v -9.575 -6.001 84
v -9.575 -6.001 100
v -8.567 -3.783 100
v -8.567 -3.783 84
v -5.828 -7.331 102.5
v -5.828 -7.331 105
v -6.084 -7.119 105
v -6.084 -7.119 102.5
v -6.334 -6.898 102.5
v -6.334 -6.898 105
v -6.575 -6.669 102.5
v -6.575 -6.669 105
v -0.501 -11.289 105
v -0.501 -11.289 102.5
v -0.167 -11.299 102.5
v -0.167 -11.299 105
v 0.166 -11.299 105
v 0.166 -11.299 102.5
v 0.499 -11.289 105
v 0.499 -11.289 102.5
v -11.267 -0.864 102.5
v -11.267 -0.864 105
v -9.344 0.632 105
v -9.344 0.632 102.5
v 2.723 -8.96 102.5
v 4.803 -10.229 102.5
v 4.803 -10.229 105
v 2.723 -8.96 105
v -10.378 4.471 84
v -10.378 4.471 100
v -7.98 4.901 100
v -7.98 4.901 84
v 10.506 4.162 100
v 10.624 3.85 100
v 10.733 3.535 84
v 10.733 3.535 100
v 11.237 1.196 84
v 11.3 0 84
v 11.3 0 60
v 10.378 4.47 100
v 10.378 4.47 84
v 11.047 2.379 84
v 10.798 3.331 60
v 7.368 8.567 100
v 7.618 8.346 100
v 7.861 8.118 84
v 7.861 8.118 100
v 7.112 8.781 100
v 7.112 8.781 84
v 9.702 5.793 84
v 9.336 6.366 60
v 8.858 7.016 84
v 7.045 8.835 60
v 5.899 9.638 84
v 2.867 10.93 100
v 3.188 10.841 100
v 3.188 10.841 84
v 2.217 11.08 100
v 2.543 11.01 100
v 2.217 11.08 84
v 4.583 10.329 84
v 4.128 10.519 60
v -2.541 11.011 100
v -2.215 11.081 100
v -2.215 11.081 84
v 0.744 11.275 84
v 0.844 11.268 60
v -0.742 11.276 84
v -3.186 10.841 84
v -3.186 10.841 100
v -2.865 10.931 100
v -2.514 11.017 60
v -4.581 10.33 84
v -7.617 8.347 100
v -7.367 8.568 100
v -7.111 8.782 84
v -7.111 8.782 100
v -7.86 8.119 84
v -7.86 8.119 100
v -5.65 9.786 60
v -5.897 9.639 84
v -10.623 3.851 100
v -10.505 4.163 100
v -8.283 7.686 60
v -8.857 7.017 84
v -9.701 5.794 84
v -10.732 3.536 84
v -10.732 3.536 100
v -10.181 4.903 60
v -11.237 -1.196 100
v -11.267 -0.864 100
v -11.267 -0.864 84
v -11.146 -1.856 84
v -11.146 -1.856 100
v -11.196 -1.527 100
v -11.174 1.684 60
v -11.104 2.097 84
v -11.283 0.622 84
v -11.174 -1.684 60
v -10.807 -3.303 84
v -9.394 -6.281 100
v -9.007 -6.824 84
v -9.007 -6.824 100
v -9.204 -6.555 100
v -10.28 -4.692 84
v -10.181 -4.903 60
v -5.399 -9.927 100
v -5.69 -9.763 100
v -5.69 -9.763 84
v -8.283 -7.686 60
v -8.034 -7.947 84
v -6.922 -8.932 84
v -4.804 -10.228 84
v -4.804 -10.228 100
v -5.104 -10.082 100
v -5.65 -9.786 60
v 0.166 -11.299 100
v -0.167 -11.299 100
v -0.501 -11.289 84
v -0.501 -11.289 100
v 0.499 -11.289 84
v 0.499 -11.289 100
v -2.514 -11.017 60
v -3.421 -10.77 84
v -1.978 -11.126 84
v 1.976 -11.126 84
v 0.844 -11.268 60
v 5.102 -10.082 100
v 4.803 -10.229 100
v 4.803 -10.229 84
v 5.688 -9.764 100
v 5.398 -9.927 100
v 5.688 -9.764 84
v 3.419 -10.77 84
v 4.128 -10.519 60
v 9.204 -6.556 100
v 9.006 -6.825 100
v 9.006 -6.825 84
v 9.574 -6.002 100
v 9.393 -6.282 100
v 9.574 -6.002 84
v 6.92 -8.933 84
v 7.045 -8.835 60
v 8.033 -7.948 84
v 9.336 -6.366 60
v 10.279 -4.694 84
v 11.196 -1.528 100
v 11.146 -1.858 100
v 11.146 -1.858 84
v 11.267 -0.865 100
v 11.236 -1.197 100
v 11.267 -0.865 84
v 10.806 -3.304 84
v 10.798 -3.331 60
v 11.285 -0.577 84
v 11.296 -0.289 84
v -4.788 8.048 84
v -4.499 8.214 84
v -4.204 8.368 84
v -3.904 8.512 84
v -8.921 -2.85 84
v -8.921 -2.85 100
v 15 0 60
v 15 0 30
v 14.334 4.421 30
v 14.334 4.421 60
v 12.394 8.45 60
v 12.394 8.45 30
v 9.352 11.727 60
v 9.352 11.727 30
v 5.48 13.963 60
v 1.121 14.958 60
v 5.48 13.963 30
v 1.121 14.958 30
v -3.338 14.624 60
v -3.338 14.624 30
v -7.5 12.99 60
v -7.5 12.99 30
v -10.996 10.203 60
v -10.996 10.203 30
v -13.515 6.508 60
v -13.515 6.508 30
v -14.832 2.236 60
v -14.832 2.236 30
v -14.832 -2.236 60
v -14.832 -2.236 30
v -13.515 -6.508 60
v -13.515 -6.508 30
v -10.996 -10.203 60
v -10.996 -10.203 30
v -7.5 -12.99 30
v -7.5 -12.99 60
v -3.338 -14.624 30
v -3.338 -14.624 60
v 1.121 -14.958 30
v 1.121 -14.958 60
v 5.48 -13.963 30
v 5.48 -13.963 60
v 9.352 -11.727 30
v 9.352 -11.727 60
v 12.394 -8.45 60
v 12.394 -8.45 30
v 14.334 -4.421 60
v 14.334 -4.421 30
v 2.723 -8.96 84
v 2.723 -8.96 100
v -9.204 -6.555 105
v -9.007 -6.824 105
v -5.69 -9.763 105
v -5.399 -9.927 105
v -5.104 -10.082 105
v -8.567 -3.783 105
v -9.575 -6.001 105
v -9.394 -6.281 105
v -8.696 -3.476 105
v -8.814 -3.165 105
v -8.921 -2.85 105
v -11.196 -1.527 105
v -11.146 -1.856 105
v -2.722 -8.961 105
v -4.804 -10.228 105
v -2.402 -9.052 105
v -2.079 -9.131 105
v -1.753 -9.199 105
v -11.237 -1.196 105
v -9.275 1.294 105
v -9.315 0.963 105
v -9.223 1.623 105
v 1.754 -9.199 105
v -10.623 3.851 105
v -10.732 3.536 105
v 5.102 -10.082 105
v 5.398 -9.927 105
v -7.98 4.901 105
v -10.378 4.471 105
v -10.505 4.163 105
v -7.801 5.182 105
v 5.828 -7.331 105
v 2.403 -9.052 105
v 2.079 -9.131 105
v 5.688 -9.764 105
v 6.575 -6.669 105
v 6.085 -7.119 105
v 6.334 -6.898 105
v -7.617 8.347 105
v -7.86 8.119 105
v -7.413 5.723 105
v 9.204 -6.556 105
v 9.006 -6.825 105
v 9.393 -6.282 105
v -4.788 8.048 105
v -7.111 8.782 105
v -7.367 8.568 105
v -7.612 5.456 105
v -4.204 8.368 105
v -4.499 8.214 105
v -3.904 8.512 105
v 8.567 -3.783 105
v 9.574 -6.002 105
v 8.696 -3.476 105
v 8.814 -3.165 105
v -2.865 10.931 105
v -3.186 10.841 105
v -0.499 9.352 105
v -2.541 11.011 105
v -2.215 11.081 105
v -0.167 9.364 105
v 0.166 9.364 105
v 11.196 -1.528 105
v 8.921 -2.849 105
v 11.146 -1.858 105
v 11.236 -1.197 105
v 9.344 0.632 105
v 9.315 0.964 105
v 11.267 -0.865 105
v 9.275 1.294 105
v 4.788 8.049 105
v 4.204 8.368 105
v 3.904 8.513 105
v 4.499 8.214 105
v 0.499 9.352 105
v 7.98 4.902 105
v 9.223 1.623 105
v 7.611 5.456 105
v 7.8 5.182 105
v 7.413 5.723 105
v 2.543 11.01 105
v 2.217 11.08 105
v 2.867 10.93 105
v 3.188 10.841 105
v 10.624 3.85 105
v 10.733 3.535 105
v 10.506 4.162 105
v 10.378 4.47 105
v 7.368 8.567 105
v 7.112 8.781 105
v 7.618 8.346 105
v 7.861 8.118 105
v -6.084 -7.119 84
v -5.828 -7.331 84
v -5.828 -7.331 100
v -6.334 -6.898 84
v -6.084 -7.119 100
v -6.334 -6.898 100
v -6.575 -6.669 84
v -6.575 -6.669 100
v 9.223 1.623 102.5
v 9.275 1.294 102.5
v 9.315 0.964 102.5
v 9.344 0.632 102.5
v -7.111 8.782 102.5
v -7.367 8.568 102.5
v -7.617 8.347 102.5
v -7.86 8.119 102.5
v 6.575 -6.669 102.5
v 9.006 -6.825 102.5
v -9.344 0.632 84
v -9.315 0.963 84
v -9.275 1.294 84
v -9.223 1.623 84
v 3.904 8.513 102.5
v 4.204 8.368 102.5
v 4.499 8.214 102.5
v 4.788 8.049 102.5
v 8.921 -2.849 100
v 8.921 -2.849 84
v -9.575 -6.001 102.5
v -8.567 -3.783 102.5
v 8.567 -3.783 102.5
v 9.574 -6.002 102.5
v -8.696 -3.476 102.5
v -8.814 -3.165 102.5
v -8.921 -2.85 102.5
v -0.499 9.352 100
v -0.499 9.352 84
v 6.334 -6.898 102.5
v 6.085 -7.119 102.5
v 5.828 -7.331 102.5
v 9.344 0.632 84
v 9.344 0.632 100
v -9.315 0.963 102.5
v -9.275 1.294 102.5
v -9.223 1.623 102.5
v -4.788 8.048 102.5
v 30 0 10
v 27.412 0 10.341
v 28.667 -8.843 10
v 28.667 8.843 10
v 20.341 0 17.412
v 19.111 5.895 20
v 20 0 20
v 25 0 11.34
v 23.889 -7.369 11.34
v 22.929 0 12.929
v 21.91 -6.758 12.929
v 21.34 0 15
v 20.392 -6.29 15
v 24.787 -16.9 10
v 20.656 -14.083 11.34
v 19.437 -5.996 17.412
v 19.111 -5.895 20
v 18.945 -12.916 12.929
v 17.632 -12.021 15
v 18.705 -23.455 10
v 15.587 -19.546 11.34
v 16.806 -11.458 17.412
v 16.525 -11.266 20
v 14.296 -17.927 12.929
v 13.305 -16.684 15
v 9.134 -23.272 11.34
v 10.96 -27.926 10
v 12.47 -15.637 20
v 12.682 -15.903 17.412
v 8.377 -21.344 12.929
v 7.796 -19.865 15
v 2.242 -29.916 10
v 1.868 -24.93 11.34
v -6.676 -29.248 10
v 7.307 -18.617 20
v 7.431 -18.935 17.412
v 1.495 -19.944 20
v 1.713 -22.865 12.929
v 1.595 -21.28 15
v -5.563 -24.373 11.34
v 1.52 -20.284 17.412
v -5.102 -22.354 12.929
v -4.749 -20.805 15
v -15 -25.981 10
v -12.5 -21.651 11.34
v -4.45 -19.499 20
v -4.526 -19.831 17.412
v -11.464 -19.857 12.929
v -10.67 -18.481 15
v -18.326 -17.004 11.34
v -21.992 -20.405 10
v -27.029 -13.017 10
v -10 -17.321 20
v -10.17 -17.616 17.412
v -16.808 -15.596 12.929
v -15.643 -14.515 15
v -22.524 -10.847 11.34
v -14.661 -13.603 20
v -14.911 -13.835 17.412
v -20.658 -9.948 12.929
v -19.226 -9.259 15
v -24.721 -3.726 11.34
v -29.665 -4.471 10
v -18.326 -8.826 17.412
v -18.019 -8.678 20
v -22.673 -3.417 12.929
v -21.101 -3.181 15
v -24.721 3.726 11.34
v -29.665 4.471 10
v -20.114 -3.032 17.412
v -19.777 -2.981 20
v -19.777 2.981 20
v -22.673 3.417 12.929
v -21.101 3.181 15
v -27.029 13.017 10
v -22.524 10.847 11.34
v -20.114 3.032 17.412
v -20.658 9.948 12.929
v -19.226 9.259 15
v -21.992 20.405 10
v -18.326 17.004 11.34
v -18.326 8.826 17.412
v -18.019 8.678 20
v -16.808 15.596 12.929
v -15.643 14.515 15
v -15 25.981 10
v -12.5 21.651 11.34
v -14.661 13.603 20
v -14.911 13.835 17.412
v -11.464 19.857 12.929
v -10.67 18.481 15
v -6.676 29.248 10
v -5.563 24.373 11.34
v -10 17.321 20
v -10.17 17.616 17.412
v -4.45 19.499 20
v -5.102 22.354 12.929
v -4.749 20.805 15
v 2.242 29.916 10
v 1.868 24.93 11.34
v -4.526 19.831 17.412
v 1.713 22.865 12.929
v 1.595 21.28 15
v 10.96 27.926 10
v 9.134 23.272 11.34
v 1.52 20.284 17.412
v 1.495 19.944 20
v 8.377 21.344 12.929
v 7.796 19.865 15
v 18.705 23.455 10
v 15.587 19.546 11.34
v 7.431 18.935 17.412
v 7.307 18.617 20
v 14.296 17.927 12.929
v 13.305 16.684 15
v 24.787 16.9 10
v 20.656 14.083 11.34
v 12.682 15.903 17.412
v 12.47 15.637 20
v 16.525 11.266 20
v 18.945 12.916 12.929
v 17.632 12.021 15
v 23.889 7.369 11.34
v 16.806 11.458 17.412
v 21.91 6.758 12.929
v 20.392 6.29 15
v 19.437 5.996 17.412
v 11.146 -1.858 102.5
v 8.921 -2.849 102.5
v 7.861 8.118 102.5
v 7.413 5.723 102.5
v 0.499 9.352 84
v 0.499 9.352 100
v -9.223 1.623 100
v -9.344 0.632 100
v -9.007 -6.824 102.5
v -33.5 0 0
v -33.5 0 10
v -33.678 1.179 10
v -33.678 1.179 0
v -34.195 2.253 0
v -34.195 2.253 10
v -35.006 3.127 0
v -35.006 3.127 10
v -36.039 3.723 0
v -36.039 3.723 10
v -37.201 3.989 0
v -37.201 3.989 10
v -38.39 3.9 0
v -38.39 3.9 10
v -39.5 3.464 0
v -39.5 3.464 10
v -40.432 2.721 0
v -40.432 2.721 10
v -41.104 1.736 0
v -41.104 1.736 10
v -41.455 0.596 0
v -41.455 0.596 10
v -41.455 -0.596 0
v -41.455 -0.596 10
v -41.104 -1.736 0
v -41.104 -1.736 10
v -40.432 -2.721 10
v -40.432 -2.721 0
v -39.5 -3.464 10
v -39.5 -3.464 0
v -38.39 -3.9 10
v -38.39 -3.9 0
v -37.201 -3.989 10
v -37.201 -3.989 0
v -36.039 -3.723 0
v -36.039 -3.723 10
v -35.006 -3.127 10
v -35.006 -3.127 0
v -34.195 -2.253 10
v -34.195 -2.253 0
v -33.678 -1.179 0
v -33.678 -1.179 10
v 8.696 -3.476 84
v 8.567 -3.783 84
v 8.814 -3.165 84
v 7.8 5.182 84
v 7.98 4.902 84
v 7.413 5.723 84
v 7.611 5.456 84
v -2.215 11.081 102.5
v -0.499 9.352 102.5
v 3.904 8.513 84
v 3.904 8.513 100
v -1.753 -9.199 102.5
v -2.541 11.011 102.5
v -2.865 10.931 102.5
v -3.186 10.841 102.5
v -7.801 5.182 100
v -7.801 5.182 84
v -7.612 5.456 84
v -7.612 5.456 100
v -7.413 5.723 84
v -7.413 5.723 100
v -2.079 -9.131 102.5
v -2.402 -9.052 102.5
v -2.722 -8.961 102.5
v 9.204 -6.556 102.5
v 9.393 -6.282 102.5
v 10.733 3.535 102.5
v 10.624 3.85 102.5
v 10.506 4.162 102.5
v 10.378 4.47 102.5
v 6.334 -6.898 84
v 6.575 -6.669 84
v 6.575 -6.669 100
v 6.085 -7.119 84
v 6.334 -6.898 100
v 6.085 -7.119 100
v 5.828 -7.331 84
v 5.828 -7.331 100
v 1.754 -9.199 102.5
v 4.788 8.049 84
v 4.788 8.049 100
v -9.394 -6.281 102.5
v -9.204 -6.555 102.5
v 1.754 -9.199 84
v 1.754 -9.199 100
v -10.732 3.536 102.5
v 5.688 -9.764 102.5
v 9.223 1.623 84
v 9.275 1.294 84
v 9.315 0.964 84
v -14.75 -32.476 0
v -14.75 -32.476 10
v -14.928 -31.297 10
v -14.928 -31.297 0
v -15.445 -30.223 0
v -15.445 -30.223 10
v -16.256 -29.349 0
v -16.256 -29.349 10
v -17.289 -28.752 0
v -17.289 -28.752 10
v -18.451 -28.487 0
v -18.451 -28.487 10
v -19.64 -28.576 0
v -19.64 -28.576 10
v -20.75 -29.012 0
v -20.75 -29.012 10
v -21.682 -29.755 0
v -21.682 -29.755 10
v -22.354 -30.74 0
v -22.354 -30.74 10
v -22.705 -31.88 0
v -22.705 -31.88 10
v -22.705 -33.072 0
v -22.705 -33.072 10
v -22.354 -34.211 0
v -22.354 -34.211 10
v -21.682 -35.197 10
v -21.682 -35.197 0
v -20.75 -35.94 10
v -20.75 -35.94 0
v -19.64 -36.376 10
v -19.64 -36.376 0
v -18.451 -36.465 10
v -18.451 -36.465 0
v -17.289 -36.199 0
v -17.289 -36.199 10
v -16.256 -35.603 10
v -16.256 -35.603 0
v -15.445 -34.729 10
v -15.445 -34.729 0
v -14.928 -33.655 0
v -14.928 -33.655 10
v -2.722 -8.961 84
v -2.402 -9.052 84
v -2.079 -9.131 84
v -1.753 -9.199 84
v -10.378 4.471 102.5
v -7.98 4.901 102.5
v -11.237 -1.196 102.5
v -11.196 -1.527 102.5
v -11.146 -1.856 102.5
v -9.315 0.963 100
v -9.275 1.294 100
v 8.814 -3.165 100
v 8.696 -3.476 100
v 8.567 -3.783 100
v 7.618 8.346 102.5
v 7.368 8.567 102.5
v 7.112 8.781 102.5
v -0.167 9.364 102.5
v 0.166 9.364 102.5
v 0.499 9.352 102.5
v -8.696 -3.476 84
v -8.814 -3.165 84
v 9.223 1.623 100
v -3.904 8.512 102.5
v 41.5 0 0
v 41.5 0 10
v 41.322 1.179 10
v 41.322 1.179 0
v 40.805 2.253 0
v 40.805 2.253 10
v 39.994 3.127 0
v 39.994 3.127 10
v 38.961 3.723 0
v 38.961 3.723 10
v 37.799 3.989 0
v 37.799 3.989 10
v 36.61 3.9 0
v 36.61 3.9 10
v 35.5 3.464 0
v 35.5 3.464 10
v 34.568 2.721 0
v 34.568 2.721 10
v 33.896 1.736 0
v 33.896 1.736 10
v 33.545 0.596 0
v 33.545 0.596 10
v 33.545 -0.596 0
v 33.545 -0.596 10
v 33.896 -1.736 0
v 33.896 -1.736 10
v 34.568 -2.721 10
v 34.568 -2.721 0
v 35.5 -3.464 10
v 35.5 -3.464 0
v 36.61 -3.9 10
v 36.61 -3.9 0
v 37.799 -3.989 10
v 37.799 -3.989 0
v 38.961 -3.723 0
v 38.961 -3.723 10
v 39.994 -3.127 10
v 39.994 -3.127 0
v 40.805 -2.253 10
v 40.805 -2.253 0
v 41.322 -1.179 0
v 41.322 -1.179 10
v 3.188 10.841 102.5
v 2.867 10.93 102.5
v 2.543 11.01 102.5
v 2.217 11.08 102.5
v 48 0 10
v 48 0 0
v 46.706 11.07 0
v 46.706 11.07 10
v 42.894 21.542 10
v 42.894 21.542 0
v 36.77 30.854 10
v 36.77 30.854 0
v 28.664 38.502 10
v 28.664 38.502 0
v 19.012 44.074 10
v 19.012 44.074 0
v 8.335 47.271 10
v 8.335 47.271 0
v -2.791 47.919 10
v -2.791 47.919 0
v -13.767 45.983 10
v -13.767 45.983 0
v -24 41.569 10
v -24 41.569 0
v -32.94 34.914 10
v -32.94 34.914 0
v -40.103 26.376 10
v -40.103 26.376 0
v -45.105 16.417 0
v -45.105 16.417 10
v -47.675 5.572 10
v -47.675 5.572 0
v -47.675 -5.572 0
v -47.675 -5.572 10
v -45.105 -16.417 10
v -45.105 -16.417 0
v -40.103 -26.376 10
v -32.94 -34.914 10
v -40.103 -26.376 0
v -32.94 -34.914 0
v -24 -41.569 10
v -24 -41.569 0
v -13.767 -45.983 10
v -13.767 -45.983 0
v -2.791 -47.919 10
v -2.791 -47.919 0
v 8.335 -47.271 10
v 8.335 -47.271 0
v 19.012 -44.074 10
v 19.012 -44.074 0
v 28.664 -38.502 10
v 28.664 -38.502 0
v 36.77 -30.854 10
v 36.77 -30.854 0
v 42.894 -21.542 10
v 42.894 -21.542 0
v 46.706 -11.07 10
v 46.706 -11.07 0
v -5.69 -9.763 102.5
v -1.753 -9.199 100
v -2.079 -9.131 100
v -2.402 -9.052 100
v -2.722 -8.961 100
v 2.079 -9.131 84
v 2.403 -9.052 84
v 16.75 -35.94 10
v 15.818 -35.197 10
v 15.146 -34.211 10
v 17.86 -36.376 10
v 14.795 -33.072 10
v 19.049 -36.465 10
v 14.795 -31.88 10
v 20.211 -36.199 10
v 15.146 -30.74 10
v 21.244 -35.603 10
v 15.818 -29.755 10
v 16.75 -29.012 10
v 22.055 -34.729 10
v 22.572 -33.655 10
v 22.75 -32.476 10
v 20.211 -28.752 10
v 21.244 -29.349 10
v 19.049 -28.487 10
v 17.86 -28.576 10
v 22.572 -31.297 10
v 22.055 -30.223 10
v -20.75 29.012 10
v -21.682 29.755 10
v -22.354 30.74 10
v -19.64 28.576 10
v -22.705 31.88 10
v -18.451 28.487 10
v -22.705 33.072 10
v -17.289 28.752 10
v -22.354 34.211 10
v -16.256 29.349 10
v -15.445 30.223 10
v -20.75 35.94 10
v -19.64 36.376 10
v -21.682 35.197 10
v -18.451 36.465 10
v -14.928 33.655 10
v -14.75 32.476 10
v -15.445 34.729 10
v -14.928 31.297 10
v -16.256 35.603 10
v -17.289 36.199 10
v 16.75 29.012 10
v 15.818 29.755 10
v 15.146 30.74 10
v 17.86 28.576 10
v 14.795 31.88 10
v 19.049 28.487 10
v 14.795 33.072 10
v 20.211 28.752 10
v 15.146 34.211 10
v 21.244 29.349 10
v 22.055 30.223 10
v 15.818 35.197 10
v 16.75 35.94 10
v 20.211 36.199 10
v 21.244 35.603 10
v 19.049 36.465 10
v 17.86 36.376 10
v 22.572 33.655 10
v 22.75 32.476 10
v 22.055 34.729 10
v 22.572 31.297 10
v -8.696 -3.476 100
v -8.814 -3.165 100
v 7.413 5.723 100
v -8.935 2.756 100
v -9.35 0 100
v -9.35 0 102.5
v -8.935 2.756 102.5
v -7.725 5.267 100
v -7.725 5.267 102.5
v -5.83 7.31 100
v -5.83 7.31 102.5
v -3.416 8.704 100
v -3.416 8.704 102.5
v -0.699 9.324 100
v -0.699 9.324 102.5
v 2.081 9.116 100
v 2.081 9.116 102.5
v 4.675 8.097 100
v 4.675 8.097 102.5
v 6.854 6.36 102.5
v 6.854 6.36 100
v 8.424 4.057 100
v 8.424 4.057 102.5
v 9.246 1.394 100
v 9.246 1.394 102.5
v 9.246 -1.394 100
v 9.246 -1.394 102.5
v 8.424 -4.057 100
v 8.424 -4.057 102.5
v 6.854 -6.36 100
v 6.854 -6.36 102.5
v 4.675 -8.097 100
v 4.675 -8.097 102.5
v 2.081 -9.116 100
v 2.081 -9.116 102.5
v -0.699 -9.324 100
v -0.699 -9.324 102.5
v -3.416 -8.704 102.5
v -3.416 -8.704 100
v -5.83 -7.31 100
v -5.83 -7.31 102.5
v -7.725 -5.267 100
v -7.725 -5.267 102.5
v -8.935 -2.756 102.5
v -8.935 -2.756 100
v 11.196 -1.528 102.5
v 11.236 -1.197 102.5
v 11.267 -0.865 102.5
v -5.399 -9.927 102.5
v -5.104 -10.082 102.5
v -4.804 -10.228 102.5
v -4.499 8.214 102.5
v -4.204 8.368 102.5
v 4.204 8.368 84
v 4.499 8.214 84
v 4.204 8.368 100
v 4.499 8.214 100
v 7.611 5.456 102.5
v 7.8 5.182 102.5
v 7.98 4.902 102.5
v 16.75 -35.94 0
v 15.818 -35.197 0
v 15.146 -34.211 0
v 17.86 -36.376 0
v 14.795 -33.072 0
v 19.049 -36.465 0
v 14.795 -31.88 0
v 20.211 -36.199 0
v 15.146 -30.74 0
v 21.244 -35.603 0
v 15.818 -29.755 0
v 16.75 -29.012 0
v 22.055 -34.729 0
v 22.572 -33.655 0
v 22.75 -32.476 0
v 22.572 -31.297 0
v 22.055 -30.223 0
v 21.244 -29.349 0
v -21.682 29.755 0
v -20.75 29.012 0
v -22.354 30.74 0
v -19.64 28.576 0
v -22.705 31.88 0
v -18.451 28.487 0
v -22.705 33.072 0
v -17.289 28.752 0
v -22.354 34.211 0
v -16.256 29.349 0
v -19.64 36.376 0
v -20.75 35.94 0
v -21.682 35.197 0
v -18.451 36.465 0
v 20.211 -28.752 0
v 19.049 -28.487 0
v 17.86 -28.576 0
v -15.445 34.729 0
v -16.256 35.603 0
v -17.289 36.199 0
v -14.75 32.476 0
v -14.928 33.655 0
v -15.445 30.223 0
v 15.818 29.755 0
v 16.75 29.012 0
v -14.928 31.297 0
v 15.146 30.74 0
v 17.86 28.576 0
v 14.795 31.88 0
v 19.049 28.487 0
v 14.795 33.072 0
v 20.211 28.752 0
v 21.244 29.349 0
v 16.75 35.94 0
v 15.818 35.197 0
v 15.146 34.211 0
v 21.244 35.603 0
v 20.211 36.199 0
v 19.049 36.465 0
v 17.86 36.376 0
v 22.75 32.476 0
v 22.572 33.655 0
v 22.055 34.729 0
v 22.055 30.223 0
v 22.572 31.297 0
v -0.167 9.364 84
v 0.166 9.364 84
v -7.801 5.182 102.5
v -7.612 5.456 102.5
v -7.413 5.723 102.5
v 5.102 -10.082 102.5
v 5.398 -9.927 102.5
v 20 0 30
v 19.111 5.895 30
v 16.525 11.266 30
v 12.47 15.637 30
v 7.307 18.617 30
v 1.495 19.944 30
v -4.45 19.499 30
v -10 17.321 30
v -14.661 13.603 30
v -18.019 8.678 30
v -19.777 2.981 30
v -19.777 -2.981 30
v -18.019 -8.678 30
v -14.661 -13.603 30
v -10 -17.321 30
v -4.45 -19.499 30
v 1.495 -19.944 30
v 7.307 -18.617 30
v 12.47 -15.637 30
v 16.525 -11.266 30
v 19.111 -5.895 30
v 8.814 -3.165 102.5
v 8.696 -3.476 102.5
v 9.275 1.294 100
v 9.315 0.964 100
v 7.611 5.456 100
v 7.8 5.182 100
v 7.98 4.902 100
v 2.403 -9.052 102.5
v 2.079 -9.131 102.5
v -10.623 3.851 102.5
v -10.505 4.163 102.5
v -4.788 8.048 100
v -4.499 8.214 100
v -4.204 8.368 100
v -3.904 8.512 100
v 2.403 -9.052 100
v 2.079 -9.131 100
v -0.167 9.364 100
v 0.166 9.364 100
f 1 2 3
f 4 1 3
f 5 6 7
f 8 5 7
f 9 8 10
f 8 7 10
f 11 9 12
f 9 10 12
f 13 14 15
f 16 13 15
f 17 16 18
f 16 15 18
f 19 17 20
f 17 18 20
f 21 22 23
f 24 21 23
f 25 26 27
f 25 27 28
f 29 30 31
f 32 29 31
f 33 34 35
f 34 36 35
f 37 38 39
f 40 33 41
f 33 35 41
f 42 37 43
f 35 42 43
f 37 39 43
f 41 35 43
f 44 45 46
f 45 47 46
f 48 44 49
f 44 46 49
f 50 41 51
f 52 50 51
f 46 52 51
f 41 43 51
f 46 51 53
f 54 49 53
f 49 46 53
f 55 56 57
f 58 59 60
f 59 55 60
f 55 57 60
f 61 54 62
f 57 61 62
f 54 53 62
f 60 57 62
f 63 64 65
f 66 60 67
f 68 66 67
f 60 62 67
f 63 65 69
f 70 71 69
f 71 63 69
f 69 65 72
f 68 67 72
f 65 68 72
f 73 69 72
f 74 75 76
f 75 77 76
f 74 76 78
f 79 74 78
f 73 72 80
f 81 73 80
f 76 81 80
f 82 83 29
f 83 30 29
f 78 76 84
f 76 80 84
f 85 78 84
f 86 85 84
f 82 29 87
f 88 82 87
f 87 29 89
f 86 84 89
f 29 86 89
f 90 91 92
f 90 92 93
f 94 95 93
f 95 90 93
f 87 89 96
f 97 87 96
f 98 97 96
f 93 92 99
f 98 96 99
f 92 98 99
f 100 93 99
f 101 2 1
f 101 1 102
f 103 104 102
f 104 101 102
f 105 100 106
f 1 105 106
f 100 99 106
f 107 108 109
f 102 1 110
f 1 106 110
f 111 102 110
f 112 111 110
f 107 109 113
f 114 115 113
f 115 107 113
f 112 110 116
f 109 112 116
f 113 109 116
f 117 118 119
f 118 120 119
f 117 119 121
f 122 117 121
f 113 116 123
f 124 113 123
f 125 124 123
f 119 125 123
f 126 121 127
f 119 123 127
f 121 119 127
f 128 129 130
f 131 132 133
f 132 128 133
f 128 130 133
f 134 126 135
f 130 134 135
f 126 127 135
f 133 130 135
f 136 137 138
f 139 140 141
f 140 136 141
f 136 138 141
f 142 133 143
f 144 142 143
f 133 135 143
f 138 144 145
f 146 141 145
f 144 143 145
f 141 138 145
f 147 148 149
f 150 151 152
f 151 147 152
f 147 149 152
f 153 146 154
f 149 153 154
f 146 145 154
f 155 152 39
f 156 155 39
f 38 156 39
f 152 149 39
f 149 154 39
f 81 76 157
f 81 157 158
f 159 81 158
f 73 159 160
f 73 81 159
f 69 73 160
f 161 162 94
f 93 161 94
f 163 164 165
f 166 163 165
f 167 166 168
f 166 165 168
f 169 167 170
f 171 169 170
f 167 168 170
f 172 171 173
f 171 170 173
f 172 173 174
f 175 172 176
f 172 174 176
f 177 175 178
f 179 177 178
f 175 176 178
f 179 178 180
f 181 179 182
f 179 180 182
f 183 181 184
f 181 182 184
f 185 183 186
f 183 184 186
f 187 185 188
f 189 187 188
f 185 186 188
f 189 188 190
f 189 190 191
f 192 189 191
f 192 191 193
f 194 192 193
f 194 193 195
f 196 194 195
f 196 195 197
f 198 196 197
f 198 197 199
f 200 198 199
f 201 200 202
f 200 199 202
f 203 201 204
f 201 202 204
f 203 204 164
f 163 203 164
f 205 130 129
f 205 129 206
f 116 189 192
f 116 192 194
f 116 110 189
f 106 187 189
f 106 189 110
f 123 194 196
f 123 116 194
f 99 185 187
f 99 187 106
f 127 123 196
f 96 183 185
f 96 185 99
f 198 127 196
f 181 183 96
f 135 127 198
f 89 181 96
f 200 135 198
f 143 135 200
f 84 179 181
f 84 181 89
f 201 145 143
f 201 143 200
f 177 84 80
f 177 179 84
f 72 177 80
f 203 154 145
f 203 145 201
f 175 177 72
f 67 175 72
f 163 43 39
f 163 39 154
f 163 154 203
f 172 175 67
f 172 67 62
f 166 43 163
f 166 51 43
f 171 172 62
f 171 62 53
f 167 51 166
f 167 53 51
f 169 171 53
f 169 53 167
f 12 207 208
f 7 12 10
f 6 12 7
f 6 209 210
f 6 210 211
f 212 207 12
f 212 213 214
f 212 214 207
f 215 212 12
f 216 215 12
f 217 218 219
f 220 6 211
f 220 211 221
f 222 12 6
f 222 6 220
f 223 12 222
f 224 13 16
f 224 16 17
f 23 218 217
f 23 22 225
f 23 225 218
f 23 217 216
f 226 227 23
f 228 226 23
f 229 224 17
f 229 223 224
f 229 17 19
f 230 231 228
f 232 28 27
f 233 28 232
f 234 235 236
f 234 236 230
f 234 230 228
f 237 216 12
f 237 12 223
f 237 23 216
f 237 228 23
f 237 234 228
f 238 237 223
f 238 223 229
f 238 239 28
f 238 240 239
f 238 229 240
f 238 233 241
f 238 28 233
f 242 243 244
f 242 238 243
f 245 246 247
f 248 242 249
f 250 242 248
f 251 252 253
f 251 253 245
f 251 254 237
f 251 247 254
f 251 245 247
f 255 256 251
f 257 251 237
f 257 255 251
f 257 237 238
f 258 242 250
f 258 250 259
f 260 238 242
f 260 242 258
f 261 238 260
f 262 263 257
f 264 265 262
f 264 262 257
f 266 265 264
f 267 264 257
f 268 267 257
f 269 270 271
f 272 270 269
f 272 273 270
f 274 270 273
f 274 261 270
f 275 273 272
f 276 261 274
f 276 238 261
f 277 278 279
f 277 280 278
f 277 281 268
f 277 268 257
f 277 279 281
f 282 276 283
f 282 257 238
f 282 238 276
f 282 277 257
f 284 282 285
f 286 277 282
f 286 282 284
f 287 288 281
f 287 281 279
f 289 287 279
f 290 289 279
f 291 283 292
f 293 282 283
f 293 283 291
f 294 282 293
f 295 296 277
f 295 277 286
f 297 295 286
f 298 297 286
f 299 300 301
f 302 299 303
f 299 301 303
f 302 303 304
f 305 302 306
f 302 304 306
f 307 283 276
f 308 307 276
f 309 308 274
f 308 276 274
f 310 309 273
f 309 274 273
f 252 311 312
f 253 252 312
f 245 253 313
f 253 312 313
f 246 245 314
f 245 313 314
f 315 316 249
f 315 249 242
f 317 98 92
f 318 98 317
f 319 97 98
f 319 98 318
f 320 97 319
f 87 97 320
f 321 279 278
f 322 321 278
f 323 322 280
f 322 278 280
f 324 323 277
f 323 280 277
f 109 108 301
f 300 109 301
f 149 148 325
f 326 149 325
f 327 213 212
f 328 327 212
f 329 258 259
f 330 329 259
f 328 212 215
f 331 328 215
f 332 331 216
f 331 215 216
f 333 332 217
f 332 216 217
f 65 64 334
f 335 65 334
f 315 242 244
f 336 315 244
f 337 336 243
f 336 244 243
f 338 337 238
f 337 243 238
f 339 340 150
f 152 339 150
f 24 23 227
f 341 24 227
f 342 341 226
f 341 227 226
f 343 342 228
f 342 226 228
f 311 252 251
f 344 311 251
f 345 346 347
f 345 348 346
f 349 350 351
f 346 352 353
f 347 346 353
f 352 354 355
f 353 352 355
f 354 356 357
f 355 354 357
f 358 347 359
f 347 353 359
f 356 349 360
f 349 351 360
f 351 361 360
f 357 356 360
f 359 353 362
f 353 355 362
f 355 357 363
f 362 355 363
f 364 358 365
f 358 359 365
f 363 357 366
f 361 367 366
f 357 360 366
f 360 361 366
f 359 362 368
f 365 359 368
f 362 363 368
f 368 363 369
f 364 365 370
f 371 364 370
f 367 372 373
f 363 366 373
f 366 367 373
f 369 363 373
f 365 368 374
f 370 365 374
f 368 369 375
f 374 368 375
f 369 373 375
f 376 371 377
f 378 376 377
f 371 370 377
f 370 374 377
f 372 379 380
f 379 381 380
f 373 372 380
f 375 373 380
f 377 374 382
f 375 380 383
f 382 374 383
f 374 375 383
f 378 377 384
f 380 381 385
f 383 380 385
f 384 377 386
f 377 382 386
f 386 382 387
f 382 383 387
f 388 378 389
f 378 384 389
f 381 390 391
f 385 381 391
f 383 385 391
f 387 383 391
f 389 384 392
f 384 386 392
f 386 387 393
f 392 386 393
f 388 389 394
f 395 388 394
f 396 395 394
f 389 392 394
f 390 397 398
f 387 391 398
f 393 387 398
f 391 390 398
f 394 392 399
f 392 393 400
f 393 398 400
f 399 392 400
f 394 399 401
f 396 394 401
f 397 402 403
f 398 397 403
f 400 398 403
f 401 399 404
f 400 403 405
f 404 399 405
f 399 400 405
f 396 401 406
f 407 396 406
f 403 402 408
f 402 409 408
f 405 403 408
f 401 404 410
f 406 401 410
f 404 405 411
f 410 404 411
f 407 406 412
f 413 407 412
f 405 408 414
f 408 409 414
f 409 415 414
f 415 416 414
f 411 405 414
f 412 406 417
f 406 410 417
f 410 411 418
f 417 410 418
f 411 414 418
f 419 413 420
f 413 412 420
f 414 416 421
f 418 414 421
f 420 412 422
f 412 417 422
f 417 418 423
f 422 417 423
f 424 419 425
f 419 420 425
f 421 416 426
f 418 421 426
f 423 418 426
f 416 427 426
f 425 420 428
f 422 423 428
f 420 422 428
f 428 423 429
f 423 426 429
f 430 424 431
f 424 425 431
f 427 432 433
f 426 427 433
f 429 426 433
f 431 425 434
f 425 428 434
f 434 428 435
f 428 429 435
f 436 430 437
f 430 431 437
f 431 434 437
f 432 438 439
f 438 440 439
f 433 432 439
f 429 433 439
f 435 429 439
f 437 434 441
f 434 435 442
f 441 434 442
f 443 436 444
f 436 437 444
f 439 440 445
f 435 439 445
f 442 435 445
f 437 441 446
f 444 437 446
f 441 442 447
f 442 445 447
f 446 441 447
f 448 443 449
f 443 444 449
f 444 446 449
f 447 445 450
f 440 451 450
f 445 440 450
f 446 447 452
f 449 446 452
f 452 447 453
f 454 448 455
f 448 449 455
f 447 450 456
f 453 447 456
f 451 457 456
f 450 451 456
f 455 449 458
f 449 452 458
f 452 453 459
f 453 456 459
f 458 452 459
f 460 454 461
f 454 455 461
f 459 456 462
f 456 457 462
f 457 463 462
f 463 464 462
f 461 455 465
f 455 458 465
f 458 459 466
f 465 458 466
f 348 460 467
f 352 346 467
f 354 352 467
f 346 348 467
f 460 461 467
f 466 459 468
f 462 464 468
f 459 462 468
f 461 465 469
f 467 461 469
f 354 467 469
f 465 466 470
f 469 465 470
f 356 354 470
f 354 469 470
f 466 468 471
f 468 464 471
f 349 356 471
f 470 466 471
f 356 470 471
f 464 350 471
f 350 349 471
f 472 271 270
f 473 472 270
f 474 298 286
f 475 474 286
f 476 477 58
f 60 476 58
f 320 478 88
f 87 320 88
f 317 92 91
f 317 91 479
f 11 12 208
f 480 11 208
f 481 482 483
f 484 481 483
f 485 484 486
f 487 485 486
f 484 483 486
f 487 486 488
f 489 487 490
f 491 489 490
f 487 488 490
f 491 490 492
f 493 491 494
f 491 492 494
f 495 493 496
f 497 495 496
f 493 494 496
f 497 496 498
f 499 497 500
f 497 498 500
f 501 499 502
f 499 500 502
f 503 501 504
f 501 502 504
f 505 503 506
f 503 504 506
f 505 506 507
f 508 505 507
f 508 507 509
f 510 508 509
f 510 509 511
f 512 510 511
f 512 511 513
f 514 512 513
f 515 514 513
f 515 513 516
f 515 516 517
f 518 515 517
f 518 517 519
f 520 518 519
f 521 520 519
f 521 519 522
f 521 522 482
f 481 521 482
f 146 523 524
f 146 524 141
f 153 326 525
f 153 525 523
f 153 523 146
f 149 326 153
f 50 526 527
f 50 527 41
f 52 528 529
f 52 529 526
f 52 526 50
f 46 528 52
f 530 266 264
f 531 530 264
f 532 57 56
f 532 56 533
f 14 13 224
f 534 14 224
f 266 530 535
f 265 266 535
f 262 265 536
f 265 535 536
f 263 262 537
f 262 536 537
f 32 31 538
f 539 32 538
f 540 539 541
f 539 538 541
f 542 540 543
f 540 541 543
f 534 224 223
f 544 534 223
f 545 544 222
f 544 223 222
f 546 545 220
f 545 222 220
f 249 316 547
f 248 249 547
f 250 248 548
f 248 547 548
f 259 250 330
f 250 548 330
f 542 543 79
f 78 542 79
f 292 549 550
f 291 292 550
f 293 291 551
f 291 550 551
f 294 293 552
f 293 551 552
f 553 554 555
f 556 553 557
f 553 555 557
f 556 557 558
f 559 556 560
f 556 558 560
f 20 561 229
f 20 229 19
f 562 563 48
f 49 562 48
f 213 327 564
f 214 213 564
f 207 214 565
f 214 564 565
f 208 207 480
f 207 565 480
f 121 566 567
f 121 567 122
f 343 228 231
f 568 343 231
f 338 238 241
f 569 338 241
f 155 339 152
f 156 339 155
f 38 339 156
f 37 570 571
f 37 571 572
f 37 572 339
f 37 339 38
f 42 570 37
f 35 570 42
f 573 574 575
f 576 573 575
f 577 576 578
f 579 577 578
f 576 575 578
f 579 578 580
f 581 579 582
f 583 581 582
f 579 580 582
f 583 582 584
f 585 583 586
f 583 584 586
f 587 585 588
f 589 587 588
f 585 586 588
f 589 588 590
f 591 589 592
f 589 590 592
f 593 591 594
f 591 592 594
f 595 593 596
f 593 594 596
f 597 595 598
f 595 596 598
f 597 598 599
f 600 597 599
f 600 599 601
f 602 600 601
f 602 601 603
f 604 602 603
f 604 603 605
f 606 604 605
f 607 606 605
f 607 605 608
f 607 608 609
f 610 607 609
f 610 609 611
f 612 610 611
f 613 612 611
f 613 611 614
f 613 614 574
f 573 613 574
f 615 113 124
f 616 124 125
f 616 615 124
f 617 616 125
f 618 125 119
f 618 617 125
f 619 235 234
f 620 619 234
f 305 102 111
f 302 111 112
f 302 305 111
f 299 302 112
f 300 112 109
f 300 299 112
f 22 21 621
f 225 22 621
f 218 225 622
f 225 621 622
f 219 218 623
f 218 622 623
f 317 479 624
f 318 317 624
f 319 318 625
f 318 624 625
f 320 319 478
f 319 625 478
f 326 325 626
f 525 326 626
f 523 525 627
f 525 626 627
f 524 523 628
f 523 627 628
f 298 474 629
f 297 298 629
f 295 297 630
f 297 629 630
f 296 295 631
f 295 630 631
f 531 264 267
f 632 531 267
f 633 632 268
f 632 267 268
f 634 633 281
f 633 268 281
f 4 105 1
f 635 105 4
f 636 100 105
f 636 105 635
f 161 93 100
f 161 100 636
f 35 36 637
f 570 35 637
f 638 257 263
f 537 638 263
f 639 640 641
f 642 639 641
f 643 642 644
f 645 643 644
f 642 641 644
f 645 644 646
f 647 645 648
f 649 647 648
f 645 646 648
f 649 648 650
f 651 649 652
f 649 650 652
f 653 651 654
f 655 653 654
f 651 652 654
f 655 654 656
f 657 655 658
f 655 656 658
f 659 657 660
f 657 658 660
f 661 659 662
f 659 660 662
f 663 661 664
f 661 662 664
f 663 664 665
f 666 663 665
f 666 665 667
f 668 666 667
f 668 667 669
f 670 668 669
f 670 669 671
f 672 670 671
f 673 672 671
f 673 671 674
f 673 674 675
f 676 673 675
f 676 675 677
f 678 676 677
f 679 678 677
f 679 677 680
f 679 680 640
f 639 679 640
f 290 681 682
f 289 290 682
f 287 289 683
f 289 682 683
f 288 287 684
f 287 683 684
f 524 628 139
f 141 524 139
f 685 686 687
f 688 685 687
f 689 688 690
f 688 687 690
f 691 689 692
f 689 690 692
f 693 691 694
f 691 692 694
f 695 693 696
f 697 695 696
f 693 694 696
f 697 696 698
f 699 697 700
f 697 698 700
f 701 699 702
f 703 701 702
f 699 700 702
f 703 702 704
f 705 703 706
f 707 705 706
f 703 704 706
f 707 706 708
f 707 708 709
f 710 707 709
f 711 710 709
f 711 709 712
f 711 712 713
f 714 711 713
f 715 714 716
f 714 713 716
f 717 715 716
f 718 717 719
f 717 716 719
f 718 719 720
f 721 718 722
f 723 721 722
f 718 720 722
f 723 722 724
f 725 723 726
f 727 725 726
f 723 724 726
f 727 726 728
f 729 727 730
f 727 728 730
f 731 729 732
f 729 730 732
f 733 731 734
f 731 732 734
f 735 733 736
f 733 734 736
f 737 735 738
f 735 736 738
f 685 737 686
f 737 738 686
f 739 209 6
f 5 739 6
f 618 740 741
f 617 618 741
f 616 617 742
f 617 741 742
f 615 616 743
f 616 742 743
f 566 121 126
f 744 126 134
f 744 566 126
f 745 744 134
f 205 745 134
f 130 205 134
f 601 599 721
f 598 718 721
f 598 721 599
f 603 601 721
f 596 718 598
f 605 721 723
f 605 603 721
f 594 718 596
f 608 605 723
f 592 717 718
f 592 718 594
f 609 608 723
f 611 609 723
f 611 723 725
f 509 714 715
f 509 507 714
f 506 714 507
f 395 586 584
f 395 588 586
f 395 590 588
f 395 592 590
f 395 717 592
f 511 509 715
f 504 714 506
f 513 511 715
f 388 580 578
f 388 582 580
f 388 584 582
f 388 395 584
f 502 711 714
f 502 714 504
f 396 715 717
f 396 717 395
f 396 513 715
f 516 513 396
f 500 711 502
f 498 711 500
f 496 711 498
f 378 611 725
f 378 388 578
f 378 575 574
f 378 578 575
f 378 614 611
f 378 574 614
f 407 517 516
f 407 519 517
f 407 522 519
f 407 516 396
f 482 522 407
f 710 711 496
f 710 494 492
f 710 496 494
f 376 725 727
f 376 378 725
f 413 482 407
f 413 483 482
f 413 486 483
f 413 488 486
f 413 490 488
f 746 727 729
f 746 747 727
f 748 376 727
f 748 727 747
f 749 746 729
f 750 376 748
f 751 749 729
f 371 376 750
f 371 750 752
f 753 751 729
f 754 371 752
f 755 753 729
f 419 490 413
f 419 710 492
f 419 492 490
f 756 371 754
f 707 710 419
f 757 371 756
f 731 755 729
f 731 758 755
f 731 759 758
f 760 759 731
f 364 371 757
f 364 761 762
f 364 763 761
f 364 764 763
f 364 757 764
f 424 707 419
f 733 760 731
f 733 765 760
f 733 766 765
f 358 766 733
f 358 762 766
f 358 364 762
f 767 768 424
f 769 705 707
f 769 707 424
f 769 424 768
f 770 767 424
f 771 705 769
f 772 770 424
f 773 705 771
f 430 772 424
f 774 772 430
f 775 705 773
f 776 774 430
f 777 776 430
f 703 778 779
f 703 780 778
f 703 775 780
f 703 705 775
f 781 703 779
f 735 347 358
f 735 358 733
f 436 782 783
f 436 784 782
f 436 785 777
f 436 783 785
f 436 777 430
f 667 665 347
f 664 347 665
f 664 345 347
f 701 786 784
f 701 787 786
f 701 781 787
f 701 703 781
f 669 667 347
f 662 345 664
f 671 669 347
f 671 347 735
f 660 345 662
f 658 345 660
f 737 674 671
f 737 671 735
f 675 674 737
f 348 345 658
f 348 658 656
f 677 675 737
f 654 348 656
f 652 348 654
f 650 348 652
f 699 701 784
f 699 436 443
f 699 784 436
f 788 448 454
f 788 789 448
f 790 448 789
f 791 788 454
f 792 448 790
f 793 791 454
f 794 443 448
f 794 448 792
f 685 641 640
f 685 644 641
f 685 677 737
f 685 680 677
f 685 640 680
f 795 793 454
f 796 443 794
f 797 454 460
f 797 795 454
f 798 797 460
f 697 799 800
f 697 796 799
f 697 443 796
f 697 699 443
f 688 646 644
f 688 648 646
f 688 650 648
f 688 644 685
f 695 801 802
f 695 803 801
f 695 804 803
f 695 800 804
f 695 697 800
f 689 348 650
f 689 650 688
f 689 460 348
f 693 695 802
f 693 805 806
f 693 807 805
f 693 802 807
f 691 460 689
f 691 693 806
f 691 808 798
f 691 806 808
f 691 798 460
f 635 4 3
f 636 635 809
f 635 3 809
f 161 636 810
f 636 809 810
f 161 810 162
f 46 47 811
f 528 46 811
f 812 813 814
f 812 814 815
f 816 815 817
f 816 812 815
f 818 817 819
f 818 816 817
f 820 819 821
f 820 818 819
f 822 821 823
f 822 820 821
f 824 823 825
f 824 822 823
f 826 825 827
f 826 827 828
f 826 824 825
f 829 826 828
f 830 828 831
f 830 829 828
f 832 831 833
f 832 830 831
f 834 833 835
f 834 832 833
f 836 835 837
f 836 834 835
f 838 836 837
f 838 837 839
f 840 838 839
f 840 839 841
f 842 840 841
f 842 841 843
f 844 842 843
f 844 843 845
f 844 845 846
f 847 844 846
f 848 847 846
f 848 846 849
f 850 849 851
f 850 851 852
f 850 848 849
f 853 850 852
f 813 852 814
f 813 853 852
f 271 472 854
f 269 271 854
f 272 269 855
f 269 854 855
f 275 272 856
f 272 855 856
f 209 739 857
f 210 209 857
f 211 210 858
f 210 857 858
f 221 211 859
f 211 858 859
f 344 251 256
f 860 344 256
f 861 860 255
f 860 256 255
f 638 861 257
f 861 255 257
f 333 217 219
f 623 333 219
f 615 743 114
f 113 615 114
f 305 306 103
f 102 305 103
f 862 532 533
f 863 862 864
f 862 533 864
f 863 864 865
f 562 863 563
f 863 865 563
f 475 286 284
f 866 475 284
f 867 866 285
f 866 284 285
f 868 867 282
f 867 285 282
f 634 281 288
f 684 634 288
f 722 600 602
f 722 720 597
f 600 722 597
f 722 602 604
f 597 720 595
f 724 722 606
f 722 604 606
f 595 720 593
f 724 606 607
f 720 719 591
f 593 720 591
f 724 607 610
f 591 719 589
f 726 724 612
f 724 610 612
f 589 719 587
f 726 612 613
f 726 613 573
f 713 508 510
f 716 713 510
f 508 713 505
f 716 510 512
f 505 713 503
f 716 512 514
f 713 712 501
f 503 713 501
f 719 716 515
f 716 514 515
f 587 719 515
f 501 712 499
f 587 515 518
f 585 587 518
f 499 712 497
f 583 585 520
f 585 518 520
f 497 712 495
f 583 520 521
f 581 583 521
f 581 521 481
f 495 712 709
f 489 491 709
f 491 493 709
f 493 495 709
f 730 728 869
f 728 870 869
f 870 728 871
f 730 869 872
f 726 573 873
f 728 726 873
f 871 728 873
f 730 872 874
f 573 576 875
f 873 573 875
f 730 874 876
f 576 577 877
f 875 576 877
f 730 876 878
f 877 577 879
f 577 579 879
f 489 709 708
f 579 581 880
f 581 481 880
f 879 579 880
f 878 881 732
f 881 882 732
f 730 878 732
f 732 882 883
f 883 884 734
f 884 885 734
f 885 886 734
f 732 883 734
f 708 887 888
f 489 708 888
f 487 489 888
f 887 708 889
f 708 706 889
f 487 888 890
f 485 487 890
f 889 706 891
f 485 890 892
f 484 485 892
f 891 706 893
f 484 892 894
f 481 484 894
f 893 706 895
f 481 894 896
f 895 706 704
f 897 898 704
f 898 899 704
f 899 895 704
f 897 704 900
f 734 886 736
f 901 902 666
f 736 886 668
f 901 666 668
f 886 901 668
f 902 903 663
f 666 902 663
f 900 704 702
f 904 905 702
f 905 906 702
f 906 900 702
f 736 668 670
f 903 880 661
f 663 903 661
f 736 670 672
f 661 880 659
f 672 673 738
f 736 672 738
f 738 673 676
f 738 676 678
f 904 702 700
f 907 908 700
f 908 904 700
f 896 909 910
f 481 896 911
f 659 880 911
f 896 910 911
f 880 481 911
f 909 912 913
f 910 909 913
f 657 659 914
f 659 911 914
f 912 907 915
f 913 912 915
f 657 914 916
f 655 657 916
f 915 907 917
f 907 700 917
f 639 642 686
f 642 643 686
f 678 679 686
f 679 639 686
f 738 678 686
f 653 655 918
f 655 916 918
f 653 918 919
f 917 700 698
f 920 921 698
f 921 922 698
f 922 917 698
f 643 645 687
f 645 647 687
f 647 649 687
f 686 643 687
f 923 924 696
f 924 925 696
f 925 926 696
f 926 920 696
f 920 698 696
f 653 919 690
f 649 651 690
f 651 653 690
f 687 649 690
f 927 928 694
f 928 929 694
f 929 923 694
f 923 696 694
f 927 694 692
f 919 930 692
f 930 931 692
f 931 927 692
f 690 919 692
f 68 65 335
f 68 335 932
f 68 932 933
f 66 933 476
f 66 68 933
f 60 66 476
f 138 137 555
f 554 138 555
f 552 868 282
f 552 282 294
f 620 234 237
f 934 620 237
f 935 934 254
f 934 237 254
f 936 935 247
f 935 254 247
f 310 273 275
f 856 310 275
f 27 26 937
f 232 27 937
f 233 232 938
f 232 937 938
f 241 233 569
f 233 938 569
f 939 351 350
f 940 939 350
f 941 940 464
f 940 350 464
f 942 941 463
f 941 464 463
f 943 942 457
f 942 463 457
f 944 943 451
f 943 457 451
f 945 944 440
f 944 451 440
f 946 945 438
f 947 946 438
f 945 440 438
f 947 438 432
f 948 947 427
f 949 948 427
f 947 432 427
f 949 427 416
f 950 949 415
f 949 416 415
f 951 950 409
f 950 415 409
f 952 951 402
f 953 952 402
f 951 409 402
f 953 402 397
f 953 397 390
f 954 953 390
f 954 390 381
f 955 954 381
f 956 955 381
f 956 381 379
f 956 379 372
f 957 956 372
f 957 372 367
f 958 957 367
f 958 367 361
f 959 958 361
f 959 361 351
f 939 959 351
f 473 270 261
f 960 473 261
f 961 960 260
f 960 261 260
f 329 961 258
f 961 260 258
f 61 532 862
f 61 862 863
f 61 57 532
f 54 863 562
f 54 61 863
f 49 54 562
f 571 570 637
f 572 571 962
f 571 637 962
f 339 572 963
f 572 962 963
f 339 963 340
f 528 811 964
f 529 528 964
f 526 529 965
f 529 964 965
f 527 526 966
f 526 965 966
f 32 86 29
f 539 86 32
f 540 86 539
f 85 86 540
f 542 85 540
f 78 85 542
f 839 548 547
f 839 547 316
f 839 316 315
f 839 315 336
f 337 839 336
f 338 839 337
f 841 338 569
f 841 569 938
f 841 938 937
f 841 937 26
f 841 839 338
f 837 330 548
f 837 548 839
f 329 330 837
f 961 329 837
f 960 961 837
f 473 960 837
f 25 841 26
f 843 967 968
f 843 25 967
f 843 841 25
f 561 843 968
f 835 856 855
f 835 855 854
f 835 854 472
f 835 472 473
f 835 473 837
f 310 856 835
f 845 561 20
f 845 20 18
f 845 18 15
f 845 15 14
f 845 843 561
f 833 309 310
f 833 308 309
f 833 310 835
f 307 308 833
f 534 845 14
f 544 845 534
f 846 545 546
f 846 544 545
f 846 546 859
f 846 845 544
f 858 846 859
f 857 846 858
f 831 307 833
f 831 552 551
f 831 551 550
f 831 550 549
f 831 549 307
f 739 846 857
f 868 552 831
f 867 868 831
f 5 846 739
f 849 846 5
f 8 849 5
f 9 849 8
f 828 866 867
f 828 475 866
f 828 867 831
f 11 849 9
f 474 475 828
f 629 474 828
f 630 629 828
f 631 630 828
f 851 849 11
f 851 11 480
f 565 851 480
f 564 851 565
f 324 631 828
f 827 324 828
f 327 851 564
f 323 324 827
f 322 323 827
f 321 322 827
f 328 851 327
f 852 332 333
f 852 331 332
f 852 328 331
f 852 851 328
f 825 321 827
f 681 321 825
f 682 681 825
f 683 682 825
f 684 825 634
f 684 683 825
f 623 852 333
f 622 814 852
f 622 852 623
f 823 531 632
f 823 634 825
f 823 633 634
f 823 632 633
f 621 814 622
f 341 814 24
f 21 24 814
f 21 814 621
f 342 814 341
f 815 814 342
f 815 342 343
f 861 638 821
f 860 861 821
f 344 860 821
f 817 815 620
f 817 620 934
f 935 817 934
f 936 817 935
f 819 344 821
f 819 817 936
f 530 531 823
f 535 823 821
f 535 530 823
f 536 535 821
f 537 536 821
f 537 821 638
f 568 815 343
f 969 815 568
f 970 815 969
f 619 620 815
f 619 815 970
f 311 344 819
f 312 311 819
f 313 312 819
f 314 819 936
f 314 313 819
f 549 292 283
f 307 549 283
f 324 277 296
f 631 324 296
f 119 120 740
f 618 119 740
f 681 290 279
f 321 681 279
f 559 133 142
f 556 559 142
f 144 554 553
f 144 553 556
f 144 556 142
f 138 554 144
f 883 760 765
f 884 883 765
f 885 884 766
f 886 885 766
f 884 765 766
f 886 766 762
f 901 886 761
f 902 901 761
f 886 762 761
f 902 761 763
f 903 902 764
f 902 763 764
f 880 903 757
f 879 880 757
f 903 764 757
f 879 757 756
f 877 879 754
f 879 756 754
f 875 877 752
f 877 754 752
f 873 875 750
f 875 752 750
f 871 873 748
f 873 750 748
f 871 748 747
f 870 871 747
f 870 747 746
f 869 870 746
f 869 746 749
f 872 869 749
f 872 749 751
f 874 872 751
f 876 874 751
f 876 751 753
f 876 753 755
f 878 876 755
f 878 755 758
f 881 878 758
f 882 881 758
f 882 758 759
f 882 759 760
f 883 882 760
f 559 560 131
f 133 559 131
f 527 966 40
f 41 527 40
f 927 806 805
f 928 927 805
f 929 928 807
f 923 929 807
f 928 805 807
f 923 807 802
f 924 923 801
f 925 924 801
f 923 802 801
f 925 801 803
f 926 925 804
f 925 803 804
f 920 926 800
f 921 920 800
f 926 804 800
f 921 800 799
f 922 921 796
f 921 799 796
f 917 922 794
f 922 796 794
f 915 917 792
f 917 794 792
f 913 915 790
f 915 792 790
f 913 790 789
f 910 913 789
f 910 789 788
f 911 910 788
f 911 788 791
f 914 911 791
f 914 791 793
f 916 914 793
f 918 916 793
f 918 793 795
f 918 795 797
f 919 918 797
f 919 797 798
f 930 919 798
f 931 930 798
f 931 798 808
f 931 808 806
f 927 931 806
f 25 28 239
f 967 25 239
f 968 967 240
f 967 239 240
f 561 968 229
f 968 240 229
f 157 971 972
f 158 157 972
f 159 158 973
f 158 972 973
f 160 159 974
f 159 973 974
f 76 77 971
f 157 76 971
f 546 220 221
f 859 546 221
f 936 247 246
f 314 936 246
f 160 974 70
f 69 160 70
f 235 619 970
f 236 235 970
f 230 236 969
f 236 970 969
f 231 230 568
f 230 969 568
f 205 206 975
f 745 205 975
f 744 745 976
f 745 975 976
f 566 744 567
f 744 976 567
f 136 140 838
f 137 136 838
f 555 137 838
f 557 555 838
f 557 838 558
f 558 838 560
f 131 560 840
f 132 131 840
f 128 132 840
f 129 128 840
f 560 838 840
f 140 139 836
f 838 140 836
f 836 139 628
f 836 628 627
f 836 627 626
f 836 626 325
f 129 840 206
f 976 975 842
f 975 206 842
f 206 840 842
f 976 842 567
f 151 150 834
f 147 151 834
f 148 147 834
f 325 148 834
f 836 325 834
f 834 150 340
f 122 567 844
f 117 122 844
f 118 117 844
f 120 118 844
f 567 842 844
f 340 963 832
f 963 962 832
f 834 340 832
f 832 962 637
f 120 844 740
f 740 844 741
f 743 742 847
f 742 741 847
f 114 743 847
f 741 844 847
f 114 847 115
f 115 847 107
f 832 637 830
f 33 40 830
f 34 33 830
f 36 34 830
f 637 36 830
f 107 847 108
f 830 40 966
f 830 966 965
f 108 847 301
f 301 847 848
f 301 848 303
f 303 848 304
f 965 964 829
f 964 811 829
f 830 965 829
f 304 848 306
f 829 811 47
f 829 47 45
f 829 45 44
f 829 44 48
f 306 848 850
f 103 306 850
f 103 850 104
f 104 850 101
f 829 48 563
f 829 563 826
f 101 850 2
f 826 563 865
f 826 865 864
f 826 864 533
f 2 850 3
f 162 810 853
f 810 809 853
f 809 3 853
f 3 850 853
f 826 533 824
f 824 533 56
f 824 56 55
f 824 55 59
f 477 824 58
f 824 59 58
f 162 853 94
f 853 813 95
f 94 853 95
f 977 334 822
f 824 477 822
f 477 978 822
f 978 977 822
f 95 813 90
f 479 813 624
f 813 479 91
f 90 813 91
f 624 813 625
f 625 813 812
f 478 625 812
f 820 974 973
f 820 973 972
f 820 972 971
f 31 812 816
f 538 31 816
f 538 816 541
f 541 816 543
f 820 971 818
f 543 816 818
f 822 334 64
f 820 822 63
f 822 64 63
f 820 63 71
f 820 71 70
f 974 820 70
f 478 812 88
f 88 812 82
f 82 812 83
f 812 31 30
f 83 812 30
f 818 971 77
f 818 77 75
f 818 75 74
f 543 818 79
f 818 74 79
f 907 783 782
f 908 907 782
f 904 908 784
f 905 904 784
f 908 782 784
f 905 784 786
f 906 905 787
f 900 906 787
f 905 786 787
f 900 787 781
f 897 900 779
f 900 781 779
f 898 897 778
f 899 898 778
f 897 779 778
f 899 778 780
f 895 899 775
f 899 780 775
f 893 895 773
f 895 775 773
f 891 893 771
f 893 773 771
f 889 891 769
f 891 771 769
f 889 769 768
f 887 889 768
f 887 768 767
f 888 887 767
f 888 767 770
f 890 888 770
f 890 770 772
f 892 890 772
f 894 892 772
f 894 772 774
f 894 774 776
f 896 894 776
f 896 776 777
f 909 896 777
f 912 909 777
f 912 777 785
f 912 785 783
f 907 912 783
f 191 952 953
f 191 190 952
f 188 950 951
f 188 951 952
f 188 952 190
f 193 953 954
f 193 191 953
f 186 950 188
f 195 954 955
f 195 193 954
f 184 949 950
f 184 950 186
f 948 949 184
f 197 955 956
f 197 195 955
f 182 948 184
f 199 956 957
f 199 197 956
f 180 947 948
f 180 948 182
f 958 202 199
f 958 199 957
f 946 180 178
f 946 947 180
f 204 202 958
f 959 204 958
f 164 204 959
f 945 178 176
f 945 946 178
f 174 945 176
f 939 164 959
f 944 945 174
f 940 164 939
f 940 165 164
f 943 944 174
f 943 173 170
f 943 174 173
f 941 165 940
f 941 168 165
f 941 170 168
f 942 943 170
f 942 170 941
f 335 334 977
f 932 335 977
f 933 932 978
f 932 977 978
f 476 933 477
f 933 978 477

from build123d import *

# Parameters (mm, degrees)
SKETCH1_R           = 48
BOSS_EXTRUDE2_DEPTH = 10
SKETCH5_R           = 20
BOSS_EXTRUDE3_DEPTH = 30
SKETCH8_R           = 15
BOSS_EXTRUDE4_DEPTH = 30
SKETCH9_R           = 11.3
BOSS_EXTRUDE5_DEPTH = 45
SKETCH10_R          = 4
CUT_EXTRUDE1_DEPTH  = 45
FILLET1_R           = 10
CUT_EXTRUDE12_DEPTH = 21
SKETCH17_R          = 12.910346837
SKETCH17_R_2        = 9.35
CUT_EXTRUDE13_DEPTH = 2.5


with BuildPart() as part:
    # Sketch1 → Boss-Extrude2 (new body)
    with BuildSketch(Plane.XY):
        Circle(SKETCH1_R)
    extrude(amount=BOSS_EXTRUDE2_DEPTH)

    # Sketch5 → Boss-Extrude3 (add)
    with BuildSketch(Plane.XY):
        Circle(SKETCH5_R)
    extrude(amount=BOSS_EXTRUDE3_DEPTH)

    # Sketch8 → Boss-Extrude4 (add)
    with BuildSketch(Plane.XY.offset(30)):
        Circle(SKETCH8_R)
    extrude(amount=BOSS_EXTRUDE4_DEPTH)

    # Sketch9 → Boss-Extrude5 (add)
    with BuildSketch(Plane.XY.offset(60)):
        Circle(SKETCH9_R)
    extrude(amount=BOSS_EXTRUDE5_DEPTH)

    # Sketch10 → Cut-Extrude1 (cut)
    with BuildSketch(Plane.XY.offset(10)):
        with Locations((-37.5, 0)):
            Circle(SKETCH10_R)
        with Locations((-18.75, 32.475952642)):
            Circle(SKETCH10_R)
        with Locations((18.75, 32.475952642)):
            Circle(SKETCH10_R)
        with Locations((37.5, 0)):
            Circle(SKETCH10_R)
        with Locations((18.75, -32.475952642)):
            Circle(SKETCH10_R)
        with Locations((-18.75, -32.475952642)):
            Circle(SKETCH10_R)
    extrude(amount=-CUT_EXTRUDE1_DEPTH, mode=Mode.SUBTRACT)

    # Fillet1
    fillet1_edges = [part.edges().sort_by_distance(p)[0] for p in [
        (-20, 0, 10),
    ]]
    fillet(fillet1_edges, radius=FILLET1_R)

    # Sketch11 → Cut-Extrude12 (cut)
    with BuildSketch(Plane.XY.offset(105)):
        with BuildLine():
            Line((-10.377723879, 4.471336164), (-7.979912421, 4.901451086))
            ThreePointArc((-7.979912421, 4.901451086), (-7.707351037, 5.31977114), (-7.41288283, 5.722970658))
            Line((-7.41288283, 5.722970658), (-7.859673611, 8.118838016))
            ThreePointArc((-7.859673611, 8.118838016), (-9.29928676, 6.419755895), (-10.377723879, 4.471336164))
        make_face()
        with BuildLine():
            Line((-7.111084616, 8.781940309), (-4.788043642, 8.048469611))
            ThreePointArc((-4.788043642, 8.048469611), (-4.352299499, 8.292208034), (-3.904184691, 8.512377276))
            Line((-3.904184691, 8.512377276), (-3.186383203, 10.841446494))
            ThreePointArc((-3.186383203, 10.841446494), (-5.250700172, 10.006005582), (-7.111084616, 8.781940309))
        make_face()
        with BuildLine():
            Line((-2.215381565, 11.080707763), (-0.499291766, 9.351680744))
            ThreePointArc((-0.499291766, 9.351680744), (-0.000188596, 9.364999998), (0.498915109, 9.351700846))
            Line((0.498915109, 9.351700846), (2.216869197, 11.080410234))
            ThreePointArc((2.216869197, 11.080410234), (0.000758547, 11.299999975), (-2.215381565, 11.080707763))
        make_face()
        with BuildLine():
            ThreePointArc((3.903841837, 8.512534518), (4.351965512, 8.292383324), (4.787719471, 8.048662452))
            Line((4.787719471, 8.048662452), (7.112263581, 8.780985523))
            ThreePointArc((7.112263581, 8.780985523), (5.252043492, 10.005300553), (3.187838704, 10.841018605))
            Line((3.187838704, 10.841018605), (3.903841837, 8.512534518))
        make_face()
        with BuildLine():
            ThreePointArc((7.412652321, 5.723269221), (7.707136768, 5.320081564), (7.979715, 4.901772487))
            Line((7.979715, 4.901772487), (10.37832409, 4.469942851))
            ThreePointArc((10.37832409, 4.469942851), (9.300148567, 6.418507352), (7.860763544, 8.117782733))
            Line((7.860763544, 8.117782733), (7.412652321, 5.723269221))
        make_face()
        with BuildLine():
            ThreePointArc((9.22331349, 1.622871918), (9.296695871, 1.129013232), (9.343653989, 0.631945518))
            Line((9.343653989, 0.631945518), (11.266835622, -0.865109859))
            ThreePointArc((11.266835622, -0.865109859), (11.291705862, -0.432872656), (11.3, 0))
            ThreePointArc((11.3, 0), (11.157319766, 1.790032301), (10.732882188, 3.534860667))
            Line((10.732882188, 3.534860667), (9.22331349, 1.622871918))
        make_face()
        with BuildLine():
            ThreePointArc((8.921024692, -2.849305783), (8.756493988, -3.320698426), (8.567074452, -3.782652553))
            Line((8.567074452, -3.782652553), (9.574250893, -6.001976327))
            ThreePointArc((9.574250893, -6.001976327), (10.565414534, -4.007744468), (11.146226868, -1.857855378))
            Line((11.146226868, -1.857855378), (8.921024692, -2.849305783))
        make_face()
        with BuildLine():
            ThreePointArc((6.575036647, -6.668741867), (6.210284859, -7.009678093), (5.827881402, -7.33069051))
            Line((5.827881402, -7.33069051), (5.688320667, -9.76386235))
            ThreePointArc((5.688320667, -9.76386235), (7.492718241, -8.458674445), (9.006105299, -6.824959145))
            Line((9.006105299, -6.824959145), (6.575036647, -6.668741867))
        make_face()
        with BuildLine():
            ThreePointArc((2.722786944, -8.960449557), (2.241374312, -9.092824984), (1.753590957, -9.199355616))
            Line((1.753590957, -9.199355616), (0.499264728, -11.288965175))
            ThreePointArc((0.499264728, -11.288965175), (2.703530495, -10.971824044), (4.802793542, -10.228547023))
            Line((4.802793542, -10.228547023), (2.722786944, -8.960449557))
        make_face()
        with BuildLine():
            ThreePointArc((-4.804166743, -10.227902126), (-2.705003505, -10.97146098), (-0.500780336, -11.288898044))
            Line((-0.500780336, -11.288898044), (-1.753220435, -9.199426238))
            ThreePointArc((-1.753220435, -9.199426238), (-2.24100808, -9.092915252), (-2.722426043, -8.960559215))
            Line((-2.722426043, -8.960559215), (-4.804166743, -10.227902126))
        make_face()
        with BuildLine():
            Line((-5.689631474, -9.76309857), (-5.827586141, -7.330925233))
            ThreePointArc((-5.827586141, -7.330925233), (-6.210002527, -7.009928218), (-6.574768046, -6.669006683))
            Line((-6.574768046, -6.669006683), (-9.007021511, -6.823749959))
            ThreePointArc((-9.007021511, -6.823749959), (-7.493853802, -8.457668426), (-5.689631474, -9.76309857))
        make_face()
        with BuildLine():
            Line((-9.575056609, -6.000690871), (-8.566922092, -3.782997605))
            ThreePointArc((-8.566922092, -3.782997605), (-8.756360234, -3.321051107), (-8.920909924, -2.849665091))
            Line((-8.920909924, -2.849665091), (-11.146476196, -1.856358912))
            ThreePointArc((-11.146476196, -1.856358912), (-10.565952503, -4.006325961), (-9.575056609, -6.000690871))
        make_face()
        with BuildLine():
            Line((-11.266951667, -0.86359721), (-9.343679434, 0.631569185))
            ThreePointArc((-9.343679434, 0.631569185), (-9.296741337, 1.128638789), (-9.223378847, 1.622500431))
            Line((-9.223378847, 1.622500431), (-10.732407515, 3.53630159))
            ThreePointArc((-10.732407515, 3.53630159), (-11.217518819, 1.3628175), (-11.266951667, -0.86359721))
        make_face()
    extrude(amount=-CUT_EXTRUDE12_DEPTH, mode=Mode.SUBTRACT)

    # Sketch17 → Cut-Extrude13 (cut)
    with BuildSketch(Plane(origin=(0, 0, 100), x_dir=(-1, 0, 0), z_dir=(0, 0, -1))):
        Circle(SKETCH17_R)
        Circle(SKETCH17_R_2, mode=Mode.SUBTRACT)
    extrude(amount=-CUT_EXTRUDE13_DEPTH, mode=Mode.SUBTRACT)


solid = part.part
